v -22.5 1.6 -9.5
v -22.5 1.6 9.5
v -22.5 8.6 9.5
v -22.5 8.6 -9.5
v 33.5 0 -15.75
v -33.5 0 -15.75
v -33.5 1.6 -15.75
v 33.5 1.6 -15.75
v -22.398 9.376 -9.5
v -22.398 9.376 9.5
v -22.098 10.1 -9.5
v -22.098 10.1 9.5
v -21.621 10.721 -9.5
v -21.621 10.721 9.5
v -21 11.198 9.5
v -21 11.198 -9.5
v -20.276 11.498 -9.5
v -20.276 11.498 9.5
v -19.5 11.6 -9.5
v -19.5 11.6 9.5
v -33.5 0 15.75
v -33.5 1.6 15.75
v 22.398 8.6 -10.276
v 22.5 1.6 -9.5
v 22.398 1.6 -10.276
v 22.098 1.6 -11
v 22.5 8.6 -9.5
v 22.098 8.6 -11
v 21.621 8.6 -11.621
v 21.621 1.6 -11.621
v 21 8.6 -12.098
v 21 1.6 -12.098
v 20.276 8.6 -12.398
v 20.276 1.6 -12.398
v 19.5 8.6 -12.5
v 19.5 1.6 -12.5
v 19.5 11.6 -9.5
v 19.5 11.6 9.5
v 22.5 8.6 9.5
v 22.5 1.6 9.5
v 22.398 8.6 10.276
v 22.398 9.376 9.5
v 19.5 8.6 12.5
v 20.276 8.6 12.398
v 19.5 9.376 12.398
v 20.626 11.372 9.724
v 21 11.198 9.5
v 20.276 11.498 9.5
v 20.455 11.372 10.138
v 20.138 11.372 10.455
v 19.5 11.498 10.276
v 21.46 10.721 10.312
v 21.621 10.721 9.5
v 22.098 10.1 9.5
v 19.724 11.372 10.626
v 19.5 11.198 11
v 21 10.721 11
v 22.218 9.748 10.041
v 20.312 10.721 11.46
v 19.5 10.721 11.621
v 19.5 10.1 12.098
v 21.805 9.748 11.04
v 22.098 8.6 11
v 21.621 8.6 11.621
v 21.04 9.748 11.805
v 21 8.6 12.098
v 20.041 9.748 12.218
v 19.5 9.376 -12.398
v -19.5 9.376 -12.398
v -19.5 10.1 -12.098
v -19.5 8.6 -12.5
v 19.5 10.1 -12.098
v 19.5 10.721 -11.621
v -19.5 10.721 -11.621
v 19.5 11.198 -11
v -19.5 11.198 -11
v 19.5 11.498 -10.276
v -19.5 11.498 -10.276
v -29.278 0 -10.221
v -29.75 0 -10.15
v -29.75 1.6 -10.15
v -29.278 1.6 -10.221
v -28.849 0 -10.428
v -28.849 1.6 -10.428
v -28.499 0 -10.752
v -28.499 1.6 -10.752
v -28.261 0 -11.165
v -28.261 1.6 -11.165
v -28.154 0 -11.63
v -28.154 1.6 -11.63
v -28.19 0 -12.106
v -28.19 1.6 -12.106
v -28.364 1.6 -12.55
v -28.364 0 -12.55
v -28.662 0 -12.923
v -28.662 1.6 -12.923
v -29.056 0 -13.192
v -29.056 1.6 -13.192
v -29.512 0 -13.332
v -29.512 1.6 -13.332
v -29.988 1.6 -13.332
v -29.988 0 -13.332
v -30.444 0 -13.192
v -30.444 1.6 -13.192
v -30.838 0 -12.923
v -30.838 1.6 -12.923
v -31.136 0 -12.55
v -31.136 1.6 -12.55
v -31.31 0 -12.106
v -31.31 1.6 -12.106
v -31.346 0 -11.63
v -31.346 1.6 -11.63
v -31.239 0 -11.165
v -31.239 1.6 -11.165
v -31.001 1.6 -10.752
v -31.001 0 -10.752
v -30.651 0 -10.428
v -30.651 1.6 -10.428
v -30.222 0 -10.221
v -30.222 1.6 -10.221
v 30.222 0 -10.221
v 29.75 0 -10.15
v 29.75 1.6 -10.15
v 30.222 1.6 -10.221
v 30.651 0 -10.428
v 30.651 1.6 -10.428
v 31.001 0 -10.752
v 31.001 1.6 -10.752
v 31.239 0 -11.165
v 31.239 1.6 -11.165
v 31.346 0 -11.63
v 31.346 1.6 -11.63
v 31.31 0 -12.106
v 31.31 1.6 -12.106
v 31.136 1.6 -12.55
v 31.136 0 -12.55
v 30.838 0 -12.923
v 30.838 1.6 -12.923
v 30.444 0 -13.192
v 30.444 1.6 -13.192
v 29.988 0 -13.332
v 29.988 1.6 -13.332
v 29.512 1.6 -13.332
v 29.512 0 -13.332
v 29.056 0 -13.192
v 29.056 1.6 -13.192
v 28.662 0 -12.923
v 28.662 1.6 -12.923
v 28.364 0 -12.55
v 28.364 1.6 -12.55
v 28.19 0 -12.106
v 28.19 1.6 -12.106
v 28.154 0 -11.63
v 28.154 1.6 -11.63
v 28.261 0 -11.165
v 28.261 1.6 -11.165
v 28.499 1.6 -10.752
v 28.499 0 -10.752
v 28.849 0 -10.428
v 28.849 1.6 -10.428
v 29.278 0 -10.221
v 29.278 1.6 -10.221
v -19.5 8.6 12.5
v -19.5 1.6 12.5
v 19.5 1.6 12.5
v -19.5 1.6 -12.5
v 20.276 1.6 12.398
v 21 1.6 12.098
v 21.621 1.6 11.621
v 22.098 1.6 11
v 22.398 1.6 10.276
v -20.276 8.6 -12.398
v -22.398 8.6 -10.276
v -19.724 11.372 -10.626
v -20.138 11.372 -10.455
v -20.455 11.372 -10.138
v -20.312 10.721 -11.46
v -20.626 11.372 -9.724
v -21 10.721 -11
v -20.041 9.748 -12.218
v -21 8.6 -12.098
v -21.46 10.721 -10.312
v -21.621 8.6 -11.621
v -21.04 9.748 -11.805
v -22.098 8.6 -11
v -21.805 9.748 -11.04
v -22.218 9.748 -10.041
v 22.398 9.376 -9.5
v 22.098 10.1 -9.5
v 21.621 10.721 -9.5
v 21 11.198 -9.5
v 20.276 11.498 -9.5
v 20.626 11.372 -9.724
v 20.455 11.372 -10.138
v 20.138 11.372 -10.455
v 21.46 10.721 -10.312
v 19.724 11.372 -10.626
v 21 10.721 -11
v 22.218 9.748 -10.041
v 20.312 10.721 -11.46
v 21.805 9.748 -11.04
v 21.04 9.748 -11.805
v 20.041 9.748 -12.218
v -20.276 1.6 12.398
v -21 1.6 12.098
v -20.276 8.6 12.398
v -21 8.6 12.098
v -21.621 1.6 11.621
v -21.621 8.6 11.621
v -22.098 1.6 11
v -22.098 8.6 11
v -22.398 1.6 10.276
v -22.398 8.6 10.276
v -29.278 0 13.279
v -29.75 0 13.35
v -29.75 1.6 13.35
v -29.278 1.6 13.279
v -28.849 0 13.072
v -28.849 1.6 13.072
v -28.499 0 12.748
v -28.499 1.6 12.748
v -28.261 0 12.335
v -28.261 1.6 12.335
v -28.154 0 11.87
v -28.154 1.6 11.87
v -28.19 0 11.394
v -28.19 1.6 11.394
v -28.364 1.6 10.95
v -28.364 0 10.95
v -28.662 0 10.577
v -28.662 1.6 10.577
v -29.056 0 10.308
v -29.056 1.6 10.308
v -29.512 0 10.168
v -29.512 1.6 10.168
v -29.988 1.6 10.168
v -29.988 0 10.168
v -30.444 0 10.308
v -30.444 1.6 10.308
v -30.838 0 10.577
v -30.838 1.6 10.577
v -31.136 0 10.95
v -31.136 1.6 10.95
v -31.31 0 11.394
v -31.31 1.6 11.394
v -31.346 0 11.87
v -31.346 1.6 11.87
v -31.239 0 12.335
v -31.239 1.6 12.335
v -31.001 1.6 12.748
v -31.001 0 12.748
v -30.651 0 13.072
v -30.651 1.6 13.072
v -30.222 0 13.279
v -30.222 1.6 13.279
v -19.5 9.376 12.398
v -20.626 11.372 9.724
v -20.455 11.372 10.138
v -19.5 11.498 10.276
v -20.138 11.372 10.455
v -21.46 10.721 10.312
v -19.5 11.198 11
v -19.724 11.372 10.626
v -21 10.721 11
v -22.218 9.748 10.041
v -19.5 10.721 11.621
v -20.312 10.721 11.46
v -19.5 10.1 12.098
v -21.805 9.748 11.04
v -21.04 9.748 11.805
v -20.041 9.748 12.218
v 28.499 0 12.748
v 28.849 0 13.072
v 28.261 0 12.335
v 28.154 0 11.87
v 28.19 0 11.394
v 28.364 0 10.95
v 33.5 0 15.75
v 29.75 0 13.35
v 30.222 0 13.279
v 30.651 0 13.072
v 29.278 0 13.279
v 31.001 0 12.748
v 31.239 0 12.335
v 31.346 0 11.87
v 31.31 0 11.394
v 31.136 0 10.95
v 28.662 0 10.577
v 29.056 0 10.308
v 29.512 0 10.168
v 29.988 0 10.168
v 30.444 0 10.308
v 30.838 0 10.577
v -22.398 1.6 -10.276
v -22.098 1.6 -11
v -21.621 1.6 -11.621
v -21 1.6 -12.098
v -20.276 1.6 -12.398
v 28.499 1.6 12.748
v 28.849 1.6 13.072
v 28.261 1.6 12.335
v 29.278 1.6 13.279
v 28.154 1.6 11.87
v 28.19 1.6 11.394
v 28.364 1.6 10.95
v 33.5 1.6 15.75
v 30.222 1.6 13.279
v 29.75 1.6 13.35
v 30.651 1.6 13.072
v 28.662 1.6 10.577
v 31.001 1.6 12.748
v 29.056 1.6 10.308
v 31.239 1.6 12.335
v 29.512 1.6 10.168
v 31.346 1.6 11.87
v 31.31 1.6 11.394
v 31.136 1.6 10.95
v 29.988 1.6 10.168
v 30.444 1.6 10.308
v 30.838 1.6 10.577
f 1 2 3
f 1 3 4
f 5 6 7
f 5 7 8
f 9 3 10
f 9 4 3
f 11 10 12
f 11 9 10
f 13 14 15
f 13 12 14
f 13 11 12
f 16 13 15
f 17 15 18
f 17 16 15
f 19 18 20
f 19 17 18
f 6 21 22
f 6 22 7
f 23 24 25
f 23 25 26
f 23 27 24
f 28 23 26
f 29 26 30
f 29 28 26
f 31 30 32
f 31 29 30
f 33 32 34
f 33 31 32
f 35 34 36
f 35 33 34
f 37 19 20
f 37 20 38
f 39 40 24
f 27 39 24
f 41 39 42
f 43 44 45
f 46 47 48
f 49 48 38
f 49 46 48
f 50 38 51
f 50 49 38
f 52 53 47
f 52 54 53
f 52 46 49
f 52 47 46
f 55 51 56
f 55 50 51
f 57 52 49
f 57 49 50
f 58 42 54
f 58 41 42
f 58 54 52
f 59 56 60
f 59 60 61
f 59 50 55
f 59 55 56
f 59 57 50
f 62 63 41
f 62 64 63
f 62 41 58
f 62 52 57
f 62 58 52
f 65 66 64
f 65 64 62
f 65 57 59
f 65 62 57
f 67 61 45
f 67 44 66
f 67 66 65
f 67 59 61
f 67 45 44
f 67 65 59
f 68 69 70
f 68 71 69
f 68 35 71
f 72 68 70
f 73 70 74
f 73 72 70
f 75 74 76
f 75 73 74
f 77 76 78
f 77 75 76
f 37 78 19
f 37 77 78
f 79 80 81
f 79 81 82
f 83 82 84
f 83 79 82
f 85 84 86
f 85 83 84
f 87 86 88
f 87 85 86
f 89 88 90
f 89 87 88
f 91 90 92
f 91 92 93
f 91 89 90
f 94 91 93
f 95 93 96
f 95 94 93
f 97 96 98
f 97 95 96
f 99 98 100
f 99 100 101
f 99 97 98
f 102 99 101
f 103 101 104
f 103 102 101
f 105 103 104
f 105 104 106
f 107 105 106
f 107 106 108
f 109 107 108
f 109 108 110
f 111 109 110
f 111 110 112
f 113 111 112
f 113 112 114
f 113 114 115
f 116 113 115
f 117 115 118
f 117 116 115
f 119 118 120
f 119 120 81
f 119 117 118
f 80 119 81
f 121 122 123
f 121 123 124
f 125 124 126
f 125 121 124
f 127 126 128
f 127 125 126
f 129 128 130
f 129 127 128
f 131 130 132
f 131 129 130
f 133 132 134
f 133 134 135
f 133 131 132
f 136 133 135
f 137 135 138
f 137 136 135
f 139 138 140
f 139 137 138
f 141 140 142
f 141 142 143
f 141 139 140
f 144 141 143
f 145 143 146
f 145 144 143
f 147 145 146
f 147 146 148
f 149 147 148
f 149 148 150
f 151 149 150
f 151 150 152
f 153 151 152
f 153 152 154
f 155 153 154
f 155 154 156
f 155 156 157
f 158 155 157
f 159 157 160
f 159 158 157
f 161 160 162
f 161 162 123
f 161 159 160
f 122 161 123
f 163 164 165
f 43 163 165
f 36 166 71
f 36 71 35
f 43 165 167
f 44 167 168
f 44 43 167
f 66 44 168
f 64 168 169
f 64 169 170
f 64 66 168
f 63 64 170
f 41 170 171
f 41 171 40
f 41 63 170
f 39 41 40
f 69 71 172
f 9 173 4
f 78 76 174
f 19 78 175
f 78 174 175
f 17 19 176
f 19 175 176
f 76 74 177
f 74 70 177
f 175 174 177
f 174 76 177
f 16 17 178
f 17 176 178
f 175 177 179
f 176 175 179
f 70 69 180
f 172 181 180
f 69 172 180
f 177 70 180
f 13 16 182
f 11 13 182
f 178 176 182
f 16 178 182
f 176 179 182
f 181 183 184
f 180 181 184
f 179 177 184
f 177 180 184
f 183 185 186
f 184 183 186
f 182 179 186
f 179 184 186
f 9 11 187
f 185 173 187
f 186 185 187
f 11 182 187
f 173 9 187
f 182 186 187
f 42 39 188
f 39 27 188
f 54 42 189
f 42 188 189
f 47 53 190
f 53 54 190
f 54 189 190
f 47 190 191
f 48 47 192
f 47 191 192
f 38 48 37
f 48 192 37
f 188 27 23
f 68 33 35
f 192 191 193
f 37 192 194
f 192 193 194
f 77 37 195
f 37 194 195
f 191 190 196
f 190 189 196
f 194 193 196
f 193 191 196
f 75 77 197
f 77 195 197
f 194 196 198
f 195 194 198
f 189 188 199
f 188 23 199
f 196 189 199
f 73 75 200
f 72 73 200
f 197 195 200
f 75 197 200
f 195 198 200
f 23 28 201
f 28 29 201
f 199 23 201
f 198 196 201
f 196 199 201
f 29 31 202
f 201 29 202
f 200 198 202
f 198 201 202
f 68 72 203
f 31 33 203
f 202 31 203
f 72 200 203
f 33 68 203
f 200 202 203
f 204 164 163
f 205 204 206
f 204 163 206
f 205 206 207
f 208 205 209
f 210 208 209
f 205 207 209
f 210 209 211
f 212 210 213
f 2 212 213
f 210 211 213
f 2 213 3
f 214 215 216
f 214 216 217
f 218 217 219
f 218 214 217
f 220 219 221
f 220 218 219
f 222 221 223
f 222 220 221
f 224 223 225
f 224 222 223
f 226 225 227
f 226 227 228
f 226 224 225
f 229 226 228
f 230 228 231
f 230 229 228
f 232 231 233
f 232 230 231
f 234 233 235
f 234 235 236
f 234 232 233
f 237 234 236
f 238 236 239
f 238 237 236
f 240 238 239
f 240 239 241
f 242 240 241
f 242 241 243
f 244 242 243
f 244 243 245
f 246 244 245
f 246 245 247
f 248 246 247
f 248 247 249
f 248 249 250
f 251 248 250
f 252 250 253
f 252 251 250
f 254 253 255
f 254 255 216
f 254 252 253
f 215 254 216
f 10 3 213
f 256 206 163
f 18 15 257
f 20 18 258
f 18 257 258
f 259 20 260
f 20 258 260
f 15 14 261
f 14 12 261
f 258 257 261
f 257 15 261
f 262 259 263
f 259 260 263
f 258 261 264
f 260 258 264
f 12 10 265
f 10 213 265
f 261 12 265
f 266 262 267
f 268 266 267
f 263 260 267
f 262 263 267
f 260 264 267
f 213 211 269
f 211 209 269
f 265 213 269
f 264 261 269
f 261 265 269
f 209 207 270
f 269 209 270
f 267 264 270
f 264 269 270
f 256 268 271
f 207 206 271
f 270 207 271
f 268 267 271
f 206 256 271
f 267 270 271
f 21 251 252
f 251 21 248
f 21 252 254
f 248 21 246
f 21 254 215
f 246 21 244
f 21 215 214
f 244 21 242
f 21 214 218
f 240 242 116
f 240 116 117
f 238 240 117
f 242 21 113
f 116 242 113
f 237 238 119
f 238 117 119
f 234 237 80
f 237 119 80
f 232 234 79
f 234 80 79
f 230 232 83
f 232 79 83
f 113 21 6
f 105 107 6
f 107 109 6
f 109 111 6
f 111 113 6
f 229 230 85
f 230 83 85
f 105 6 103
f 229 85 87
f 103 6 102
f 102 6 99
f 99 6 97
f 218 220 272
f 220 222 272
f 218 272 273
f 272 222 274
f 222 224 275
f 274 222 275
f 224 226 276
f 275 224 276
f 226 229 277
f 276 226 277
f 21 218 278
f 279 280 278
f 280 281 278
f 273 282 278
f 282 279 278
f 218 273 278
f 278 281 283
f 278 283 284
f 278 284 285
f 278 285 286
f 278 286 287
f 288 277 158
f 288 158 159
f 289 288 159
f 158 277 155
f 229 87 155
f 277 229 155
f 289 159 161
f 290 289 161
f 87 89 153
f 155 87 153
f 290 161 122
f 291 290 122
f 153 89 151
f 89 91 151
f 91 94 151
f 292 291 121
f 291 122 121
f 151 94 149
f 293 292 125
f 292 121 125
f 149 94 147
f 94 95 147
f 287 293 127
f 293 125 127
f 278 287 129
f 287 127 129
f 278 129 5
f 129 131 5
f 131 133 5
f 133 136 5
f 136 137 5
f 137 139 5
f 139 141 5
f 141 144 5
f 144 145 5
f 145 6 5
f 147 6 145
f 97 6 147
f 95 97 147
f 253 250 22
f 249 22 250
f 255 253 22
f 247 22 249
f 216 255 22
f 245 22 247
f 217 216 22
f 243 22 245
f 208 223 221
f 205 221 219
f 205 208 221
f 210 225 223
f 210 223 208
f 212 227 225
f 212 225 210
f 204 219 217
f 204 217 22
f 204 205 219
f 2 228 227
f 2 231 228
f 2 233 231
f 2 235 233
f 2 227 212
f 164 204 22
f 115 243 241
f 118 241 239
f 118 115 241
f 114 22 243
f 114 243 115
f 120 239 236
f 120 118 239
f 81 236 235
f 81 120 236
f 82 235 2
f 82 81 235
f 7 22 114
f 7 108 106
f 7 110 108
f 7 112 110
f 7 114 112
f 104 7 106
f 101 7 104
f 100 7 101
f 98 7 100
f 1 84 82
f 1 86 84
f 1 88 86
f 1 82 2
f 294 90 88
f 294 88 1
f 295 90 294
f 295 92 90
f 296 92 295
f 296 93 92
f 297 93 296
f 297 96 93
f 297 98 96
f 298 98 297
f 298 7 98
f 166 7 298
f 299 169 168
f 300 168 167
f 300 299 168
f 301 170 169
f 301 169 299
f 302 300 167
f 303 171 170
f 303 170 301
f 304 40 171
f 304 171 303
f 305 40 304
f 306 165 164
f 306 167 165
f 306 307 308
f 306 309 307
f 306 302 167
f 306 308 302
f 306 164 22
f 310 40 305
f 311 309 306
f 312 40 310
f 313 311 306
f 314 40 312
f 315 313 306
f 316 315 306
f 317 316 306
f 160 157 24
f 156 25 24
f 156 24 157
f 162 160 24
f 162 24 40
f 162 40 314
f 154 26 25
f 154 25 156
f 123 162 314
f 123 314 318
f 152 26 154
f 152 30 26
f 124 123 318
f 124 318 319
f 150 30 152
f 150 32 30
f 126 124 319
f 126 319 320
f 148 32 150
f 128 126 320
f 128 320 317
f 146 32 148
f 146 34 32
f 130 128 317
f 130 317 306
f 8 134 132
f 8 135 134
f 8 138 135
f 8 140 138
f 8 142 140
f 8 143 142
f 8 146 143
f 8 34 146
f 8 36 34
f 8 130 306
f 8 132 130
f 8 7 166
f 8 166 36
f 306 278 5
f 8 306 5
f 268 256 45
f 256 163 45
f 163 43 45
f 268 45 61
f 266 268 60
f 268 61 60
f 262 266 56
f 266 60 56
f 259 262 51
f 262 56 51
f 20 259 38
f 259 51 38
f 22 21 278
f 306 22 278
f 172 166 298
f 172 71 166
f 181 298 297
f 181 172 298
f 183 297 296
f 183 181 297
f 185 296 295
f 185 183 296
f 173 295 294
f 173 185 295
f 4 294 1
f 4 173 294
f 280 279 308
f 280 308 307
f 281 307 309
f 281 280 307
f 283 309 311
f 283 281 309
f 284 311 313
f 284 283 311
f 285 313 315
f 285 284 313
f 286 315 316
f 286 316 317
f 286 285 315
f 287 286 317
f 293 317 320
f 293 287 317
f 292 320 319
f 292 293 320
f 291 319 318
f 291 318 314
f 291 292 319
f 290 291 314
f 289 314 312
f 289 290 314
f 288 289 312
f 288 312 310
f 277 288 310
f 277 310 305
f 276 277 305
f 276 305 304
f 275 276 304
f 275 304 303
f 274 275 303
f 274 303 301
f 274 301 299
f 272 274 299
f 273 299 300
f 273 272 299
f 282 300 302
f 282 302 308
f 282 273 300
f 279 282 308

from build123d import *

# Parameters (mm, degrees)
SKETCH_1_W      = 67
SKETCH_1_H      = 31.5
SKETCH_1_R      = 1.6
EXTRUDE_1_DEPTH = 1.6
SKETCH_2_W      = 45
SKETCH_2_H      = 25
EXTRUDE_2_DEPTH = 10
FILLET_1_R      = 3


with BuildPart() as part:
    # 草圖1 → 填料-伸長1 (new body)
    with BuildSketch(Plane(origin=(0, 0, 0), x_dir=(1, 0, 0), z_dir=(0, 1, 0))):
        Rectangle(SKETCH_1_W, SKETCH_1_H)
        with Locations(Location((-29.75, 11.75, 0), (0, 0, 270))):
            Circle(SKETCH_1_R, mode=Mode.SUBTRACT)
        with Locations(Location((-29.75, -11.75, 0), (0, 0, 270))):
            Circle(SKETCH_1_R, mode=Mode.SUBTRACT)
        with Locations(Location((29.75, -11.75, 0), (0, 0, 270))):
            Circle(SKETCH_1_R, mode=Mode.SUBTRACT)
        with Locations(Location((29.75, 11.75, 0), (0, 0, 270))):
            Circle(SKETCH_1_R, mode=Mode.SUBTRACT)
    extrude(amount=EXTRUDE_1_DEPTH)

    # 草圖2 → 填料-伸長2 (add)
    with BuildSketch(Plane(origin=(0, 1.6, 0), x_dir=(1, 0, 0), z_dir=(0, 1, 0))):
        Rectangle(SKETCH_2_W, SKETCH_2_H)
    extrude(amount=EXTRUDE_2_DEPTH)

    # 圓角1
    fillet_1_edges = [part.edges().sort_by_distance(p)[0] for p in [
        (22.5, 6.6, 12.5),
        (22.5, 6.6, -12.5),
        (-22.5, 6.6, -12.5),
        (-22.5, 6.6, 12.5),
        (22.5, 11.6, 0),
        (0, 11.6, -12.5),
        (-22.5, 11.6, 0),
        (0, 11.6, 12.5),
    ]]
    fillet(fillet_1_edges, radius=FILLET_1_R)


solid = part.part
